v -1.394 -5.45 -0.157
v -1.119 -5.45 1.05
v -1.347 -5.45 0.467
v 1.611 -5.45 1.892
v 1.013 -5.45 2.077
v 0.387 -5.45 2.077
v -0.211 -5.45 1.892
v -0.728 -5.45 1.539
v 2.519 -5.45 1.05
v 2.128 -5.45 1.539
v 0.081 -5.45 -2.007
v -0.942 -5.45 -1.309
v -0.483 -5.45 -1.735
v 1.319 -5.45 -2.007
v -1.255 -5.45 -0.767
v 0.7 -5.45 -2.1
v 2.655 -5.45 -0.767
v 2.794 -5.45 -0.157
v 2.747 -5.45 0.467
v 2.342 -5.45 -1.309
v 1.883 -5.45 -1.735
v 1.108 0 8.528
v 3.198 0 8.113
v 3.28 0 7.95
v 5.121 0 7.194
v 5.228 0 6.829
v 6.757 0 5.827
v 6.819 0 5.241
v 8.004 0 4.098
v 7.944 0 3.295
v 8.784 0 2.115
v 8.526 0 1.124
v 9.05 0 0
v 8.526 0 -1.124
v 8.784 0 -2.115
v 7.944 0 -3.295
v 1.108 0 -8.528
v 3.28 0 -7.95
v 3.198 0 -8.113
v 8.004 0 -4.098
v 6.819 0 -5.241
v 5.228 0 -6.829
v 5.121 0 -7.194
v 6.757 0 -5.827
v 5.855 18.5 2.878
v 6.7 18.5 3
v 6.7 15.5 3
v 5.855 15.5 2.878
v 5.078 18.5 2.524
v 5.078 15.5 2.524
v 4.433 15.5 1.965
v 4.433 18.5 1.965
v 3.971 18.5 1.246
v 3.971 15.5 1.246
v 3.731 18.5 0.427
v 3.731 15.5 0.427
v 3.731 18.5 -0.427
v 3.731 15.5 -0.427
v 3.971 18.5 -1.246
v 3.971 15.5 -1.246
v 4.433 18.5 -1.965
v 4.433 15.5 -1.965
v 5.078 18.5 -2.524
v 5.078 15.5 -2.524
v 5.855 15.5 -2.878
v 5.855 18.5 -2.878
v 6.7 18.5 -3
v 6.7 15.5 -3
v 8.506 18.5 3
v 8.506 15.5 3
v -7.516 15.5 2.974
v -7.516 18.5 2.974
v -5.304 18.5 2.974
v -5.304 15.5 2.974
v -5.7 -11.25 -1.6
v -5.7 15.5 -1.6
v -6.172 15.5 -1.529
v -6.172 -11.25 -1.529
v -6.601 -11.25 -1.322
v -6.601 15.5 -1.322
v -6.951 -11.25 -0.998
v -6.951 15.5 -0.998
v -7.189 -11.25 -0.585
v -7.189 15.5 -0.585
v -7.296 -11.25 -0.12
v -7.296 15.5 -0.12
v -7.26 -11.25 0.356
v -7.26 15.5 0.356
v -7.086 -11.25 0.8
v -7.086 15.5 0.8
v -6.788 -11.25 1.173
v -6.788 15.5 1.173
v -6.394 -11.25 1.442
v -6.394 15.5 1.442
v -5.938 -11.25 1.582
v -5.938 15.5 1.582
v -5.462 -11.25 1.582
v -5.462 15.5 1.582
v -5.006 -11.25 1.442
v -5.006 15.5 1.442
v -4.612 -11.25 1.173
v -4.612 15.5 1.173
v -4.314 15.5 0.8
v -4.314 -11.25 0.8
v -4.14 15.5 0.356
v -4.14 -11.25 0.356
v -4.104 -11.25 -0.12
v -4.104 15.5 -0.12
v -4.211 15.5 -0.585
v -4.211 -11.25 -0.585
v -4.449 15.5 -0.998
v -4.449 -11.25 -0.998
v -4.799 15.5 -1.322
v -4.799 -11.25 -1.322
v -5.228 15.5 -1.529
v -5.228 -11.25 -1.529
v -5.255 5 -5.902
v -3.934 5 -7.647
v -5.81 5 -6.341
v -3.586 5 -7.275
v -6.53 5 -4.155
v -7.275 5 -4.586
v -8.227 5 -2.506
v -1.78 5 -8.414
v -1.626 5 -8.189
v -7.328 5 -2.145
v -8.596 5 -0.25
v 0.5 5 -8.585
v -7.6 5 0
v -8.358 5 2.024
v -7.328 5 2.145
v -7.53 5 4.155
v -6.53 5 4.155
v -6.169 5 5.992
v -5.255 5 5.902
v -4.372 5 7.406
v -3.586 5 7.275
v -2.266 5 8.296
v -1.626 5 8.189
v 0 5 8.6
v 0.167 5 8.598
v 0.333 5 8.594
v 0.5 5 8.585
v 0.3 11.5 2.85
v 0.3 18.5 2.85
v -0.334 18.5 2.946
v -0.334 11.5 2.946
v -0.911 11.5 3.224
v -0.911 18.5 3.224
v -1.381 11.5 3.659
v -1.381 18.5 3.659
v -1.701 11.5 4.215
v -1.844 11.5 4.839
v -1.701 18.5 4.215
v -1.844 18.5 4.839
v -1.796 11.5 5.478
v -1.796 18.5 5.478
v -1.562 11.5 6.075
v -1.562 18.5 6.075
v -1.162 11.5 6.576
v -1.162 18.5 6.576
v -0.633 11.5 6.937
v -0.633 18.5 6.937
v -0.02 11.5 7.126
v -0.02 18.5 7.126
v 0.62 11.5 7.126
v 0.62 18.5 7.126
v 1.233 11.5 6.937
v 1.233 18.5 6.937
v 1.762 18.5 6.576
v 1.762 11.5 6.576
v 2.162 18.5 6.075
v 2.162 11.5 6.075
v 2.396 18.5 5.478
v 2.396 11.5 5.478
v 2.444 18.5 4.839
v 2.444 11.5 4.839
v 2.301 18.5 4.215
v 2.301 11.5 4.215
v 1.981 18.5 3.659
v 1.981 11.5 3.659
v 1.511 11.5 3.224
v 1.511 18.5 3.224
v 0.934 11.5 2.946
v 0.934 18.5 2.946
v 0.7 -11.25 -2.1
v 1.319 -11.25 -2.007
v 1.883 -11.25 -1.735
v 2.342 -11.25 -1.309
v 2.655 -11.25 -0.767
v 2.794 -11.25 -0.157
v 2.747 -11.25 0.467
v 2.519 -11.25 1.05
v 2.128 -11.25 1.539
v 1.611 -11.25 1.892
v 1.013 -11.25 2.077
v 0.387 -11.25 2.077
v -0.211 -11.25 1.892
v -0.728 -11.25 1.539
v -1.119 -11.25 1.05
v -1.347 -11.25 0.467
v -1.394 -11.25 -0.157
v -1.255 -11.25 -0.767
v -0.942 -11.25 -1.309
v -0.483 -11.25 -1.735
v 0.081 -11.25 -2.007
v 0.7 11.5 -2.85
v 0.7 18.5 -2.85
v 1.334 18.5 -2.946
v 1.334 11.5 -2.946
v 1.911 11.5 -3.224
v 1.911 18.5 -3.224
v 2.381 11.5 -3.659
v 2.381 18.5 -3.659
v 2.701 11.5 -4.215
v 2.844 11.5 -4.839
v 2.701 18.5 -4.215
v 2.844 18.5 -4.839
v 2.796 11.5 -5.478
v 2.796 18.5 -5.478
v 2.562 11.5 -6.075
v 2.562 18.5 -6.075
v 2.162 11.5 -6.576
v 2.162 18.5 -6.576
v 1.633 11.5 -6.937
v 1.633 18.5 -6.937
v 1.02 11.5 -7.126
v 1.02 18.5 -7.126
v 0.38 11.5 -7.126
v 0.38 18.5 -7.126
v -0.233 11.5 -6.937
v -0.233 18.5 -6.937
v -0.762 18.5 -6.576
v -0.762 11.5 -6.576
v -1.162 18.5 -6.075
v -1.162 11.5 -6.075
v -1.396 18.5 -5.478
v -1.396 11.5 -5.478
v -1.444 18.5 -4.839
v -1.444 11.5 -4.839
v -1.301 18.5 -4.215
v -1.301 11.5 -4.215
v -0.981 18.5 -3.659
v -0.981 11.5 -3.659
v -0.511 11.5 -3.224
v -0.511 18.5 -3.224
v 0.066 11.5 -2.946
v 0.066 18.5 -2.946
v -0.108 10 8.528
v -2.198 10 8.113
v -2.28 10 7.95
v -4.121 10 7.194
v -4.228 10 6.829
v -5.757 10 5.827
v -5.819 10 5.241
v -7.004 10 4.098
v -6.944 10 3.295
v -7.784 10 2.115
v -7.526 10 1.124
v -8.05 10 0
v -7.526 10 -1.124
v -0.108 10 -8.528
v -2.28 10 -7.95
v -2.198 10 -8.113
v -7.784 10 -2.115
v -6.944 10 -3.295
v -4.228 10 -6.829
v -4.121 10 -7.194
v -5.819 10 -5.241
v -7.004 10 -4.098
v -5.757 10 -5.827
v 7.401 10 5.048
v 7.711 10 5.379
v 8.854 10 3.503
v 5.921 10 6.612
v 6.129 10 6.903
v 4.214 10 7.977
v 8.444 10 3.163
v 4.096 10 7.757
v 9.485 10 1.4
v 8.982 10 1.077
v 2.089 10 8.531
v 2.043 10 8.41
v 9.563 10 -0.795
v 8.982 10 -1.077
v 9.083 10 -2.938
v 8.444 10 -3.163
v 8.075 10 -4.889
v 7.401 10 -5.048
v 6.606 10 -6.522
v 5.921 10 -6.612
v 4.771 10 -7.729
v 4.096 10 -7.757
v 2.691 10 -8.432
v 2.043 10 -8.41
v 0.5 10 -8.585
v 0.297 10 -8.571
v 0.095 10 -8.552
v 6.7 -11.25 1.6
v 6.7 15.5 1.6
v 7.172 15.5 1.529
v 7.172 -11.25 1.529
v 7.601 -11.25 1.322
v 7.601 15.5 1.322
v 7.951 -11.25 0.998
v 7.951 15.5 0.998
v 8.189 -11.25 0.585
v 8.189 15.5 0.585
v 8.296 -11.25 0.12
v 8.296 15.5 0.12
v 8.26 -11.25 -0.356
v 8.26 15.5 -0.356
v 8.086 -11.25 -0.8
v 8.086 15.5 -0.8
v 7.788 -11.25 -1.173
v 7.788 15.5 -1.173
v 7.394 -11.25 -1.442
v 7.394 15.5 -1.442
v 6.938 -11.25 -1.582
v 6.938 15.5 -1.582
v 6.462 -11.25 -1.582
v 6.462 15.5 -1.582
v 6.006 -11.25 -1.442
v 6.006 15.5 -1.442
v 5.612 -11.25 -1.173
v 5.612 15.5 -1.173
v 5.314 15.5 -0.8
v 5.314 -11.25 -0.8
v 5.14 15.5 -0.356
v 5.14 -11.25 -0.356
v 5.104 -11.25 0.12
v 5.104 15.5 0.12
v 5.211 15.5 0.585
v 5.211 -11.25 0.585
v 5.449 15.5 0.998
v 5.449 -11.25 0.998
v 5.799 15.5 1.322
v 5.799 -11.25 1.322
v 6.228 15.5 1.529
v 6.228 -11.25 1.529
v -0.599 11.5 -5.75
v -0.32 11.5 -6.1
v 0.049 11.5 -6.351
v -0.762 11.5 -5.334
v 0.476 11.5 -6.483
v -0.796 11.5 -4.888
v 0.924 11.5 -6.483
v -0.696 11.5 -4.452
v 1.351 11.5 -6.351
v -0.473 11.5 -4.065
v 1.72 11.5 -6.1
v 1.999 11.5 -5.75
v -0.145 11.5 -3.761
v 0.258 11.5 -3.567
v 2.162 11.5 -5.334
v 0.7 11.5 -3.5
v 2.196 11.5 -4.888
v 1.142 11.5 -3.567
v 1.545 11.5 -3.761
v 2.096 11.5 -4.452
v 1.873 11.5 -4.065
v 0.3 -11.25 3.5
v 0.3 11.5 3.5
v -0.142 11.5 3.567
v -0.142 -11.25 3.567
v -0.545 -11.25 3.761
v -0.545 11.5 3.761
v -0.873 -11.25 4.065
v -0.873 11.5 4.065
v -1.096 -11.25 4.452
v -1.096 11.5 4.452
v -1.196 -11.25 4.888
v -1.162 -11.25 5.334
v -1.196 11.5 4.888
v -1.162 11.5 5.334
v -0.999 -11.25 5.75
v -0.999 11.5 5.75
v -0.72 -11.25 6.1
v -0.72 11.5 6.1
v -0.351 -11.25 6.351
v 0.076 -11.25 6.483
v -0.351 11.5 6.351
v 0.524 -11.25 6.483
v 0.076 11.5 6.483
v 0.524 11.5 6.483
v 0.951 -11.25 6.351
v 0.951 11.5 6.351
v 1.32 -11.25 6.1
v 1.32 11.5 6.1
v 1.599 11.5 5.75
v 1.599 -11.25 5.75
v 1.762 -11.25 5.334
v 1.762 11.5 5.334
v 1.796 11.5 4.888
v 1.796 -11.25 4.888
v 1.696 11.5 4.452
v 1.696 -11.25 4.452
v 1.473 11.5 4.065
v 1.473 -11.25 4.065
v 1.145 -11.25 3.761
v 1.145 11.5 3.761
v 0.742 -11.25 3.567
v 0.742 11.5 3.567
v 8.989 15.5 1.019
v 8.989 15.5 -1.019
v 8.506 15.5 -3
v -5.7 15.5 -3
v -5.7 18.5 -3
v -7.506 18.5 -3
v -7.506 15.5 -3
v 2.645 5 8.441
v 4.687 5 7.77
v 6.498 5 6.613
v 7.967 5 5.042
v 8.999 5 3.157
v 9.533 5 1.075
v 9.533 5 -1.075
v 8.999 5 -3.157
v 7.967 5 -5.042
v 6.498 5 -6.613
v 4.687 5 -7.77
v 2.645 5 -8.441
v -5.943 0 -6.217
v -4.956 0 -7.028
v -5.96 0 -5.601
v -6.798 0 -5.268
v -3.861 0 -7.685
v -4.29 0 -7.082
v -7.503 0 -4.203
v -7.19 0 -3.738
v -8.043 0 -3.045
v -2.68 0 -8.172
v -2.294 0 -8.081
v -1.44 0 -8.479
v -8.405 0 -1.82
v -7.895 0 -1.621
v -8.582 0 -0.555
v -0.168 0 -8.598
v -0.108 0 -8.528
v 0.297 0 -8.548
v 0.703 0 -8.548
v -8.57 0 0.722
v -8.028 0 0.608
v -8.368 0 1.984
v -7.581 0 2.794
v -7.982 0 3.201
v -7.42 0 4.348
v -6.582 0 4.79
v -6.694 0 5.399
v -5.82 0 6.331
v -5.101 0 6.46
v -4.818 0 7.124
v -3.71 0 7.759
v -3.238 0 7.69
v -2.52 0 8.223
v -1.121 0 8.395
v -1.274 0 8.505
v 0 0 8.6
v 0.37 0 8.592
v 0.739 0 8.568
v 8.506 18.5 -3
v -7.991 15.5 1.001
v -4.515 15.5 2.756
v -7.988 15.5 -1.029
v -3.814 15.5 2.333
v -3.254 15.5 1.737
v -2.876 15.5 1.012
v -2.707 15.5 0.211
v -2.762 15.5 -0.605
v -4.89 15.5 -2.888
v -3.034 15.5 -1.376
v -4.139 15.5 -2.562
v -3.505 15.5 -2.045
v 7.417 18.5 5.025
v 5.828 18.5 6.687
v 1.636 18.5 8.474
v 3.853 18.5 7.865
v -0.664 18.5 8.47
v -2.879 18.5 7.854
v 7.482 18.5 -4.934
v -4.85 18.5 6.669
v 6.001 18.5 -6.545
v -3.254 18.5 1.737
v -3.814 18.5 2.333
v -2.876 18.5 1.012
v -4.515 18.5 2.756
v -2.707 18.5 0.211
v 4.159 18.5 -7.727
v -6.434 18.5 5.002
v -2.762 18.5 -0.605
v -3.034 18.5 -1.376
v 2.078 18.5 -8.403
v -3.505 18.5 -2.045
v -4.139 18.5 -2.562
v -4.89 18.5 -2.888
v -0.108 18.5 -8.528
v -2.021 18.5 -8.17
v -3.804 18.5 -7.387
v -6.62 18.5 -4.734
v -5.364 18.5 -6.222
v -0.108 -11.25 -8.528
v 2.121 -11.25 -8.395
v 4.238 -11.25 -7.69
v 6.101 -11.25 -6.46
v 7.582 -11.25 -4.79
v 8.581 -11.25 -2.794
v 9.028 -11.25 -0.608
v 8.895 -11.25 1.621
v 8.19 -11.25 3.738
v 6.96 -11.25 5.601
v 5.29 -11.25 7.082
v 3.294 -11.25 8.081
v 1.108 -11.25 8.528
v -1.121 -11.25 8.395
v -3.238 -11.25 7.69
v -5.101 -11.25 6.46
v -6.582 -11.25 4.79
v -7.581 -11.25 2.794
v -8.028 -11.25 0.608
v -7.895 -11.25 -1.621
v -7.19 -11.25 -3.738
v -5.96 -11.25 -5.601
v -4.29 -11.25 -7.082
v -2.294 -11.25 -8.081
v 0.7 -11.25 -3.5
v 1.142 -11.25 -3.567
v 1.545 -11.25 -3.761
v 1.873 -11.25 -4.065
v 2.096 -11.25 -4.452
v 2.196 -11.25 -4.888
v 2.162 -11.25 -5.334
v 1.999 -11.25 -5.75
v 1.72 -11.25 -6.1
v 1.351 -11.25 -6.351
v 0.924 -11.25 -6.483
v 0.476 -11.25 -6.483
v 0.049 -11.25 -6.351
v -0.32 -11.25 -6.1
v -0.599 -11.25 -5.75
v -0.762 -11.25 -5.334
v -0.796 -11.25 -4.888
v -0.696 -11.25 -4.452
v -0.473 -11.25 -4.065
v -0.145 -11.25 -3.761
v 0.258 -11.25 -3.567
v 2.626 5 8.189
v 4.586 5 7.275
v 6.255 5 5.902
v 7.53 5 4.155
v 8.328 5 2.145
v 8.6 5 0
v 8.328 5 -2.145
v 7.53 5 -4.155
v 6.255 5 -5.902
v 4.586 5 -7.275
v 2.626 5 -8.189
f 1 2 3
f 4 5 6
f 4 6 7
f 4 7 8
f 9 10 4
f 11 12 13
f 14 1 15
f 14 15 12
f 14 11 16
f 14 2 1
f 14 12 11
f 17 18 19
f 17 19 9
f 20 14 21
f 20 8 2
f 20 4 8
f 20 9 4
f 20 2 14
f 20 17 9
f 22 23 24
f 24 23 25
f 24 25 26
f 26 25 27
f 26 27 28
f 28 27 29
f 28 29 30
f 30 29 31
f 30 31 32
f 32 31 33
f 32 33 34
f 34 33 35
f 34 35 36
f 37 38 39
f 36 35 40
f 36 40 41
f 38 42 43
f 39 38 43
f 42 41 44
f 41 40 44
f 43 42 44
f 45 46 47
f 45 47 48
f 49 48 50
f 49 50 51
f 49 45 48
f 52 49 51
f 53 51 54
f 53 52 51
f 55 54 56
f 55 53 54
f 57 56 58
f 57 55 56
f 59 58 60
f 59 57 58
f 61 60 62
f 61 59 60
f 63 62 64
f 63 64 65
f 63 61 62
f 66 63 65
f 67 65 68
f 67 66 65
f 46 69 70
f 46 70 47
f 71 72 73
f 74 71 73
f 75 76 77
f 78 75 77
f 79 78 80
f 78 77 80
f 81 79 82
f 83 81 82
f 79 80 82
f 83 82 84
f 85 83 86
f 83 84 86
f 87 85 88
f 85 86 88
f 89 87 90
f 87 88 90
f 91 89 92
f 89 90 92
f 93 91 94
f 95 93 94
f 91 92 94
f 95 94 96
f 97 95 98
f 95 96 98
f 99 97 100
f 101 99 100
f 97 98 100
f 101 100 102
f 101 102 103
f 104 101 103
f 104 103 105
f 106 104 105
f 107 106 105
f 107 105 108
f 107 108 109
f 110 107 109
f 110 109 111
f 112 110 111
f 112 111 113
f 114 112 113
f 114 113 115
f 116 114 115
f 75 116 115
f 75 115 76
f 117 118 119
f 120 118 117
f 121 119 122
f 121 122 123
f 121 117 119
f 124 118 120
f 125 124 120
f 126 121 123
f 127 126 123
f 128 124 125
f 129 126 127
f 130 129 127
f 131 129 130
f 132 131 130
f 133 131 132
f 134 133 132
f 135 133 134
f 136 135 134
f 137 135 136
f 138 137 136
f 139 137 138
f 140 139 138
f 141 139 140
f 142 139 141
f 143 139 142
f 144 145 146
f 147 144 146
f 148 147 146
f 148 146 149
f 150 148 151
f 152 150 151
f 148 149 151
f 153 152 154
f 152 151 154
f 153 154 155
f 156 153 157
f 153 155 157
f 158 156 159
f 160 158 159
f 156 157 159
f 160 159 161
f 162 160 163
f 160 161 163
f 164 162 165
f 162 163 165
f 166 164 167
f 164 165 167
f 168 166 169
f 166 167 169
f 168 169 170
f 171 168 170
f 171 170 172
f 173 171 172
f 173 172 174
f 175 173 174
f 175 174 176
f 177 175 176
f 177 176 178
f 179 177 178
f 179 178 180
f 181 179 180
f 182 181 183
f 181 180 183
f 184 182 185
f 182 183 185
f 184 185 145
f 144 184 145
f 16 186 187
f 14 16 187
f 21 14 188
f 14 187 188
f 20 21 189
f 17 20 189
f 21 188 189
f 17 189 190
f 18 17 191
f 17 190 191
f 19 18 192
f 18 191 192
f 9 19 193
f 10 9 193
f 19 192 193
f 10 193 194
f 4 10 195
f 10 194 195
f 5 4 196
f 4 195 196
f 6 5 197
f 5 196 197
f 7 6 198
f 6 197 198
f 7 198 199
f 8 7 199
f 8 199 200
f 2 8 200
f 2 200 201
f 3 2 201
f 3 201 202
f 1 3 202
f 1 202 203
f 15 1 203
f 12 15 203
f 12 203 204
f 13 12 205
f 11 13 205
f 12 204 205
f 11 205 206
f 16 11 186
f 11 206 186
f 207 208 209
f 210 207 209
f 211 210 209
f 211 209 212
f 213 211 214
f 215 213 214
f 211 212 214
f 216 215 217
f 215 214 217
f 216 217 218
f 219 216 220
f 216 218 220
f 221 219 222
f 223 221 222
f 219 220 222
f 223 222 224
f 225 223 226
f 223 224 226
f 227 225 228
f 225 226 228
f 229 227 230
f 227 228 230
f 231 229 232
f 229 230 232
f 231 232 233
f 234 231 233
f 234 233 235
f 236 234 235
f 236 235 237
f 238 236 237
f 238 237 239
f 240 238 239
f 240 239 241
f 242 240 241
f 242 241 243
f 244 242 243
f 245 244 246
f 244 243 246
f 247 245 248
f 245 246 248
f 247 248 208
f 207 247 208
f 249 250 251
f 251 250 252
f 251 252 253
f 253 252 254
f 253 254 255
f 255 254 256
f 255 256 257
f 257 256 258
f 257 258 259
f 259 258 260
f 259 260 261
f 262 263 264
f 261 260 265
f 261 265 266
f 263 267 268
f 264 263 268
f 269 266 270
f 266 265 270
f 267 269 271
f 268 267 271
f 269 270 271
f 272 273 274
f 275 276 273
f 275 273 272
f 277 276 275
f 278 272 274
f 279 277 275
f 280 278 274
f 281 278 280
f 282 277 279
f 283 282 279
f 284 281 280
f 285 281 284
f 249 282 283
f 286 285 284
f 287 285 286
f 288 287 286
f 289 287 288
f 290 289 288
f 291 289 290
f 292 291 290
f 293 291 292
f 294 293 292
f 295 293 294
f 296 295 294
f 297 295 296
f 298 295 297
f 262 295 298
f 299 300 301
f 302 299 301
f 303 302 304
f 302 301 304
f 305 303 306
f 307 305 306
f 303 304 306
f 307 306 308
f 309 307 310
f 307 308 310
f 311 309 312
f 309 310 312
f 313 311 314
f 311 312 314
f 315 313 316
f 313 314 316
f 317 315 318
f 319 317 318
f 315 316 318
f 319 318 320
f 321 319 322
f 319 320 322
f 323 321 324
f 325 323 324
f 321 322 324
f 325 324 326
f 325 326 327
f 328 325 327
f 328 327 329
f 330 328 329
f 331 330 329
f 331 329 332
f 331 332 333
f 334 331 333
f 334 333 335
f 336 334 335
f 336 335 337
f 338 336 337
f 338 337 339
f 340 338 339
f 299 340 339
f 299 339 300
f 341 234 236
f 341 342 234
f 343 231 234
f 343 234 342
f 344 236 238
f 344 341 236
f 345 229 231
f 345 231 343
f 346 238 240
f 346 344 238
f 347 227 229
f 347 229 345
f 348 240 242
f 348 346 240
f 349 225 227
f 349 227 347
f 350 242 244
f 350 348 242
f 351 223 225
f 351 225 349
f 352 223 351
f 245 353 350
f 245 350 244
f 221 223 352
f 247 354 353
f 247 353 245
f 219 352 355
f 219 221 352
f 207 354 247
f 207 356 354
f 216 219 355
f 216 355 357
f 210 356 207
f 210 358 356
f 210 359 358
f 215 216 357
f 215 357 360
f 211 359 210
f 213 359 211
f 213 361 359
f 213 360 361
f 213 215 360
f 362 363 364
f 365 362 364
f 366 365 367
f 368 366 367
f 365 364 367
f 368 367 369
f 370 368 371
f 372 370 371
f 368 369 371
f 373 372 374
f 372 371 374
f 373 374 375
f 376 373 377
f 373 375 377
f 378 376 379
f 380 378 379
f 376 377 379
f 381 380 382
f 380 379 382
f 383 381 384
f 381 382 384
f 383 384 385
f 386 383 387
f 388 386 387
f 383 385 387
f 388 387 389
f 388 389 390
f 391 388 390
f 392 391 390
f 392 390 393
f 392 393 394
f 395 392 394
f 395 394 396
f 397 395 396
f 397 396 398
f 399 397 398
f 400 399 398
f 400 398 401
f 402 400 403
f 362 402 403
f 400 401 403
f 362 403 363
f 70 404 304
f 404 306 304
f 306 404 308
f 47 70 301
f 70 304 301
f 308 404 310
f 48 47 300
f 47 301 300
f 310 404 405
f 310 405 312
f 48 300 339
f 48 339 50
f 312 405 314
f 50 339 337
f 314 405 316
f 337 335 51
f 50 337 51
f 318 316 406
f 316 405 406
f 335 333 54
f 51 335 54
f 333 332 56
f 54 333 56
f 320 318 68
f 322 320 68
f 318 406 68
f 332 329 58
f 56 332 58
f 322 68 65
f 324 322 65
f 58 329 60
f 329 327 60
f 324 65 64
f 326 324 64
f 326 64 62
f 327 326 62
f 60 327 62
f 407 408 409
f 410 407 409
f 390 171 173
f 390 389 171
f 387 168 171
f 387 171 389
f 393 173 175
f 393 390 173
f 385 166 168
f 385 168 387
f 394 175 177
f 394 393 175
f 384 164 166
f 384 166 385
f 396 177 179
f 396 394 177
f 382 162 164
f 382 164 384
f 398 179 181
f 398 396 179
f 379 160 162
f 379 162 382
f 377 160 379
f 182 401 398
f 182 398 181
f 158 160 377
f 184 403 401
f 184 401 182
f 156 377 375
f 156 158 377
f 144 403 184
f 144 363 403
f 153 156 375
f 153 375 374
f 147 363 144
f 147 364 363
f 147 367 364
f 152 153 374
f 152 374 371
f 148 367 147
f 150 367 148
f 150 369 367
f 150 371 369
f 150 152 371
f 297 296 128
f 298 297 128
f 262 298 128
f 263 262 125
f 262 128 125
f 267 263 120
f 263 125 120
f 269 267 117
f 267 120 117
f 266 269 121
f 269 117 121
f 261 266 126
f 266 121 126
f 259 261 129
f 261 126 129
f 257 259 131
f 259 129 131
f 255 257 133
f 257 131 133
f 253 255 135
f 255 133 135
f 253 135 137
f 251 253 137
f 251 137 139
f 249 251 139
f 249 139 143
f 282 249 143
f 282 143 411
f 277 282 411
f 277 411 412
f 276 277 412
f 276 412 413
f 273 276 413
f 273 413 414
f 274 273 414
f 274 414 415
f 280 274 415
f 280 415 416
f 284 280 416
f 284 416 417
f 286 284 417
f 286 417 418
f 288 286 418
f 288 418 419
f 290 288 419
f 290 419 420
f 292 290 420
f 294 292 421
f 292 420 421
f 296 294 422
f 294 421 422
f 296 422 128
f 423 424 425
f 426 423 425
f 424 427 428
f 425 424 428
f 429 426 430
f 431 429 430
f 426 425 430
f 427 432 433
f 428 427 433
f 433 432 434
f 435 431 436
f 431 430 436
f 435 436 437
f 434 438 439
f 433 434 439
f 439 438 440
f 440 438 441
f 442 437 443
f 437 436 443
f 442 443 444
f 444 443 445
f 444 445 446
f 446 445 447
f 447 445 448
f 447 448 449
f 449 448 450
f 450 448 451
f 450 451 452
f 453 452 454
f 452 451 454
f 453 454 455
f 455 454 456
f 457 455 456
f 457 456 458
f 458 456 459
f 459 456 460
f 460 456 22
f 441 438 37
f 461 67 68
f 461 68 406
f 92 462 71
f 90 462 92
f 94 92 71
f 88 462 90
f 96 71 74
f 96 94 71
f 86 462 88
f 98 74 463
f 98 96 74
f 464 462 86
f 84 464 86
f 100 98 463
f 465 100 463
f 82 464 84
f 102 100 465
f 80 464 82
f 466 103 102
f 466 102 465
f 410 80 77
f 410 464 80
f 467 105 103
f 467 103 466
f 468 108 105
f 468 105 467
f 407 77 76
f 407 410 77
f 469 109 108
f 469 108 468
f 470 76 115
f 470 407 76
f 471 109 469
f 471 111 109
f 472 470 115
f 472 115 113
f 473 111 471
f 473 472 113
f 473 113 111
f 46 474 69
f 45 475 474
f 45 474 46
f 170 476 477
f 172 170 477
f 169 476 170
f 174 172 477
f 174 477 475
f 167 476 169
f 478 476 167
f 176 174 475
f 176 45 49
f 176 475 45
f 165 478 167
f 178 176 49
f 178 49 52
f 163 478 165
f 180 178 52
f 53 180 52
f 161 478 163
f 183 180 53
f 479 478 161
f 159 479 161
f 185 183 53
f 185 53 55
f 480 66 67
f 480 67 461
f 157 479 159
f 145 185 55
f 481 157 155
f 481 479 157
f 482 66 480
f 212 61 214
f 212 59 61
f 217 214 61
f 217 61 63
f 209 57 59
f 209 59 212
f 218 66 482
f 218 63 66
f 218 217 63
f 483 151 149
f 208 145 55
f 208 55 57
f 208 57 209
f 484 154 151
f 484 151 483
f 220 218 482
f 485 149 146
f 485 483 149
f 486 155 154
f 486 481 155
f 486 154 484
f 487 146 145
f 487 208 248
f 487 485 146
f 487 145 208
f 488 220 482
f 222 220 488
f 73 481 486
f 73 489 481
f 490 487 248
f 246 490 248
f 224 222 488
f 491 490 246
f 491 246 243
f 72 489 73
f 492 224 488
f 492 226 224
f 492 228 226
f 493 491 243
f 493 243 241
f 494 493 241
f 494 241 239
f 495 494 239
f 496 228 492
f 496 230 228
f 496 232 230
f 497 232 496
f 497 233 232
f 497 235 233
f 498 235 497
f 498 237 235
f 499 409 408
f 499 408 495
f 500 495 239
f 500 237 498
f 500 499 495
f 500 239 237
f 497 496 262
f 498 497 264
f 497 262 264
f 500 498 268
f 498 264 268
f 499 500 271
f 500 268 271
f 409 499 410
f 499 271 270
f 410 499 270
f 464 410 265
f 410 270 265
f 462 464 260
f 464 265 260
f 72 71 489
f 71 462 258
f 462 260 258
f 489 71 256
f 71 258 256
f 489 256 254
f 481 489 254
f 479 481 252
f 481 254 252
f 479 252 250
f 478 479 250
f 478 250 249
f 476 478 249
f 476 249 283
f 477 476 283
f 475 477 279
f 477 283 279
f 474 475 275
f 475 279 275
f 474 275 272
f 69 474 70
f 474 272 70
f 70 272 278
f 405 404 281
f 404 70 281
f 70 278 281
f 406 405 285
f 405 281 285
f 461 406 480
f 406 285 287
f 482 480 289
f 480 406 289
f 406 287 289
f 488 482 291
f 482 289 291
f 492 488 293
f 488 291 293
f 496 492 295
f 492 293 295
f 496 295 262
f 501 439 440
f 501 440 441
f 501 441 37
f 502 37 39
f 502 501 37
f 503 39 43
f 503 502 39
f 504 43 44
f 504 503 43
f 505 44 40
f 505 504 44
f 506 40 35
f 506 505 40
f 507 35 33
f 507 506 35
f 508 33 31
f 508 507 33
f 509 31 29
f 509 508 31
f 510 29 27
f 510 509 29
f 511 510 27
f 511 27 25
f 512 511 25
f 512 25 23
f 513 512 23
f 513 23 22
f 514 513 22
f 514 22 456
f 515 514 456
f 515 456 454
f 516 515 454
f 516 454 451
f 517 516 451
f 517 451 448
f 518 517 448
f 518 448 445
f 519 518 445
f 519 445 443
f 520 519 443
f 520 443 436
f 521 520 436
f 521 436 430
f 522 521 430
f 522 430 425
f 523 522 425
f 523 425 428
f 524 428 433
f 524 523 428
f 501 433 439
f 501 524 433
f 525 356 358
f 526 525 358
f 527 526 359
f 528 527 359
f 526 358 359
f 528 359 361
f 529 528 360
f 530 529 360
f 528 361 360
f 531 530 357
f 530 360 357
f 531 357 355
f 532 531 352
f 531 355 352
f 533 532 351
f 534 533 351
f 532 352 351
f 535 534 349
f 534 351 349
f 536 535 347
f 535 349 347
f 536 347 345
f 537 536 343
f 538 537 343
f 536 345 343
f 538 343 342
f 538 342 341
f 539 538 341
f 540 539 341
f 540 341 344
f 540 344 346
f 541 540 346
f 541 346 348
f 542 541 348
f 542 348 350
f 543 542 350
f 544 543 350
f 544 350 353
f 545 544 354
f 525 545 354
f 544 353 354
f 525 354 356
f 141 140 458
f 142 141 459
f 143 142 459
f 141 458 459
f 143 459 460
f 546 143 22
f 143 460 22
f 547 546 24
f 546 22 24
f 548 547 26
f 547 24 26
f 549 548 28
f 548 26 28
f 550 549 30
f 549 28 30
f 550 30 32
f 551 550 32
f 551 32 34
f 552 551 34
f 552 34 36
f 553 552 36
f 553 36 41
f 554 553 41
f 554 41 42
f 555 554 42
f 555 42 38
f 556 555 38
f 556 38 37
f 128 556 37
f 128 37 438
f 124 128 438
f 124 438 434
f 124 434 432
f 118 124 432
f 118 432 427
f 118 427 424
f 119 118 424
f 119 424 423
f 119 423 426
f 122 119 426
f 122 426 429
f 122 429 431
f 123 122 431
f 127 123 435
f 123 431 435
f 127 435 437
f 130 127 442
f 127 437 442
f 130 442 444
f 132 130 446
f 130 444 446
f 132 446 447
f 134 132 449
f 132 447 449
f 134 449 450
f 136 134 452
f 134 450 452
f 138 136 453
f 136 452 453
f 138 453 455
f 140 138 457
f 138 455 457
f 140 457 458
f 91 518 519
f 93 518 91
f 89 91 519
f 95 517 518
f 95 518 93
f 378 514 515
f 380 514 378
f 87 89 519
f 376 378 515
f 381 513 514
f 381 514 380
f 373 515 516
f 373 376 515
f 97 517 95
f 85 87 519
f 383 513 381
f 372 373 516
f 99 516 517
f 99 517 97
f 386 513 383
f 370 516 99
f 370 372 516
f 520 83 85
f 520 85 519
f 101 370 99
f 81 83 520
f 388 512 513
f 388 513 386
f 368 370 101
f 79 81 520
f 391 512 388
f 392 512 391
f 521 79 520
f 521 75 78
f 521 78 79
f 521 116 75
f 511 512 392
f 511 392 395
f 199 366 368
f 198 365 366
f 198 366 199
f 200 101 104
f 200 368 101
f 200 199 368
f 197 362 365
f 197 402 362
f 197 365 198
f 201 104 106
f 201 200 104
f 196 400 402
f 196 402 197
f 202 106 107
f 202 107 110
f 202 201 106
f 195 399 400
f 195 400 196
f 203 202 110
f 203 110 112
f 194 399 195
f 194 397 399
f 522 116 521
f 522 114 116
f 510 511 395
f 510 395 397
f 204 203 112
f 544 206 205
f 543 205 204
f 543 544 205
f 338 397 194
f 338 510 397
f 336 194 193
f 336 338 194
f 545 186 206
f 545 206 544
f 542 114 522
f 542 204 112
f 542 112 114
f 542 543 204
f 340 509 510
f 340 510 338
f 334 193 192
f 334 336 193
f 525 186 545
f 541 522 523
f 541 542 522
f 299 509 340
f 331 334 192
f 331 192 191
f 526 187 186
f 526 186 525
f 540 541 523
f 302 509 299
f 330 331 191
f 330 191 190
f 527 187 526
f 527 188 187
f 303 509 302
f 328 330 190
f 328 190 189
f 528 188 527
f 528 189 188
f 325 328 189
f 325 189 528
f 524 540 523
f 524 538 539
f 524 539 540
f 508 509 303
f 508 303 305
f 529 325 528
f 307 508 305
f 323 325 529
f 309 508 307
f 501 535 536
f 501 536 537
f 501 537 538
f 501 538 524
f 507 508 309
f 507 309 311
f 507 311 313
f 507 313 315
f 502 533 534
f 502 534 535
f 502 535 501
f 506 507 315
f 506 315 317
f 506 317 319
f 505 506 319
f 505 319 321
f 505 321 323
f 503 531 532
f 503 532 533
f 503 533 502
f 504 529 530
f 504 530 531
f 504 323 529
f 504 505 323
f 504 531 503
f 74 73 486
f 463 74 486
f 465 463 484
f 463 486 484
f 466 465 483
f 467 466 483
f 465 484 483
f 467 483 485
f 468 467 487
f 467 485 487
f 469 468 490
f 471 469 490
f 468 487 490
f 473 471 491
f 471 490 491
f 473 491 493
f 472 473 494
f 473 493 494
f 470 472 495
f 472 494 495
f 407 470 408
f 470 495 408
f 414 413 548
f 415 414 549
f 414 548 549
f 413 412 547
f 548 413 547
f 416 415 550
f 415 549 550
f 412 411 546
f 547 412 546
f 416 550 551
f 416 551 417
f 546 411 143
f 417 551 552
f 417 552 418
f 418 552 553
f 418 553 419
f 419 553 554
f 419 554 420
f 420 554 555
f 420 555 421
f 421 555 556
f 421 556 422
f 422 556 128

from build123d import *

# Parameters (mm, degrees)
SKETCH1_R            = 8.6
BOSS_EXTRUDE11_DEPTH = 5
SKETCH20_R           = 8.6
BOSS_EXTRUDE12_DEPTH = 5
SKETCH21_R           = 8.55
BOSS_EXTRUDE13_DEPTH = 1
SKETCH22_R           = 8.55
BOSS_EXTRUDE14_DEPTH = 7.5
SKETCH24_R           = 2.15
CUT_EXTRUDE8_DEPTH   = 7
BOSS_EXTRUDE15_START = 11.25
SKETCH30_R           = 8.55
BOSS_EXTRUDE15_DEPTH = 11.25
SKETCH31_R           = 1.6
CUT_EXTRUDE12_DEPTH  = 29.75
SKETCH32_R           = 1.5
CUT_EXTRUDE13_DEPTH  = 22.75
CIRPATTERN7_COUNT    = 2
CIRPATTERN8_COUNT    = 2
SKETCH33_R           = 2.1
CUT_EXTRUDE14_DEPTH  = 5.8
CUT_EXTRUDE15_DEPTH  = 3


with BuildPart() as part:
    # Sketch1 → Boss-Extrude11 (new body)
    with BuildSketch(Plane(origin=(0, 0, 0), x_dir=(1, 0, 0), z_dir=(0, 1, 0))):
        with Locations(Location((0, 0, 0), (0, 0, 270))):
            Circle(SKETCH1_R)
    extrude(amount=BOSS_EXTRUDE11_DEPTH)

    # Sketch20 → Boss-Extrude12 (add)
    with BuildSketch(Plane(origin=(0, 5, 0), x_dir=(1, 0, 0), z_dir=(0, 1, 0))):
        with Locations(Location((1, 0, 0), (0, 0, 93.333029494))):
            Circle(SKETCH20_R)
    extrude(amount=BOSS_EXTRUDE12_DEPTH)

    # Sketch21 → Boss-Extrude13 (add)
    with BuildSketch(Plane(origin=(0, 10, 0), x_dir=(1, 0, 0), z_dir=(0, 1, 0))):
        with Locations(Location((0.5, 0, 0), (0, 0, 94.074449123))):
            Circle(SKETCH21_R)
    extrude(amount=BOSS_EXTRUDE13_DEPTH)

    # Sketch22 → Boss-Extrude14 (add)
    with BuildSketch(Plane(origin=(0, 11, 0), x_dir=(1, 0, 0), z_dir=(0, 1, 0))):
        with Locations(Location((0.5, 0, 0), (0, 0, 94.074449123))):
            Circle(SKETCH22_R)
    extrude(amount=BOSS_EXTRUDE14_DEPTH)

    # Sketch24 → Cut-Extrude8 (cut)
    with BuildSketch(Plane(origin=(0, 18.5, 0), x_dir=(1, 0, 0), z_dir=(0, 1, 0))):
        with Locations(Location((0.7, 5, 0), (0, 0, 270))):
            Circle(SKETCH24_R)
    cut_extrude8 = extrude(amount=-CUT_EXTRUDE8_DEPTH, mode=Mode.SUBTRACT)

    # Sketch30 → Boss-Extrude15 (add)
    with BuildSketch(Plane.XZ.offset(BOSS_EXTRUDE15_START)):
        with Locations(Location((0.5, 0, 0), (0, 0, 265.925550877))):
            Circle(SKETCH30_R)
    extrude(amount=-BOSS_EXTRUDE15_DEPTH)

    # Sketch31 → Cut-Extrude12 (cut)
    with BuildSketch(Plane(origin=(0, 18.5, 0), x_dir=(1, 0, 0), z_dir=(0, 1, 0))):
        with Locations(Location((6.7, 0, 0), (0, 0, 270))):
            Circle(SKETCH31_R)
    cut_extrude12 = extrude(amount=-CUT_EXTRUDE12_DEPTH, mode=Mode.SUBTRACT)

    # Sketch32 → Cut-Extrude13 (cut)
    with BuildSketch(Plane(origin=(0, 11.5, 0), x_dir=(1, 0, 0), z_dir=(0, 1, 0))):
        with Locations(Location((0.7, 5, 0), (0, 0, 270))):
            Circle(SKETCH32_R)
    cut_extrude13 = extrude(amount=-CUT_EXTRUDE13_DEPTH, mode=Mode.SUBTRACT)

    # CirPattern7: Cut-Extrude12 ×2 about axis
    cirpattern7_axis = Axis((0.5, 0, 0), (0, 1, 0))
    for i in range(1, CIRPATTERN7_COUNT):
        add(cut_extrude12.rotate(cirpattern7_axis, i * 360 / CIRPATTERN7_COUNT), mode=Mode.SUBTRACT)

    # CirPattern8: Cut-Extrude8, Cut-Extrude13 ×2 about axis
    cirpattern8_axis = Axis((0.5, 0, 0), (0, 1, 0))
    add([cut_extrude8.rotate(cirpattern8_axis, i * 360 / CIRPATTERN8_COUNT) for i in range(1, CIRPATTERN8_COUNT)], mode=Mode.SUBTRACT)
    add([cut_extrude13.rotate(cirpattern8_axis, i * 360 / CIRPATTERN8_COUNT) for i in range(1, CIRPATTERN8_COUNT)], mode=Mode.SUBTRACT)

    # Sketch33 → Cut-Extrude14 (cut)
    with BuildSketch(Plane.XZ.offset(11.25)):
        with Locations(Location((0.7, 0, 0), (0, 0, 270))):
            Circle(SKETCH33_R)
    extrude(amount=-CUT_EXTRUDE14_DEPTH, mode=Mode.SUBTRACT)

    # Sketch34 → Cut-Extrude15 (cut)
    with BuildSketch(Plane(origin=(0, 18.5, 0), x_dir=(1, 0, 0), z_dir=(0, 1, 0))):
        with BuildLine():
            Line((-5.7, 3), (-9.054437868, 3))
            Line((-9.054437868, 3), (-9.054437868, -2.973683702))
            Line((-9.054437868, -2.973683702), (-5.30350884, -2.973683702))
            ThreePointArc((-5.30350884, -2.973683702), (-2.706586304, 0.198681773), (-5.7, 3))
        make_face()
        with BuildLine():
            Line((6.7, 3), (10.113600604, 3))
            Line((10.113600604, 3), (10.113600604, -3))
            Line((10.113600604, -3), (6.7, -3))
            ThreePointArc((6.7, -3), (3.7, 0), (6.7, 3))
        make_face()
    extrude(amount=-CUT_EXTRUDE15_DEPTH, mode=Mode.SUBTRACT)


solid = part.part
